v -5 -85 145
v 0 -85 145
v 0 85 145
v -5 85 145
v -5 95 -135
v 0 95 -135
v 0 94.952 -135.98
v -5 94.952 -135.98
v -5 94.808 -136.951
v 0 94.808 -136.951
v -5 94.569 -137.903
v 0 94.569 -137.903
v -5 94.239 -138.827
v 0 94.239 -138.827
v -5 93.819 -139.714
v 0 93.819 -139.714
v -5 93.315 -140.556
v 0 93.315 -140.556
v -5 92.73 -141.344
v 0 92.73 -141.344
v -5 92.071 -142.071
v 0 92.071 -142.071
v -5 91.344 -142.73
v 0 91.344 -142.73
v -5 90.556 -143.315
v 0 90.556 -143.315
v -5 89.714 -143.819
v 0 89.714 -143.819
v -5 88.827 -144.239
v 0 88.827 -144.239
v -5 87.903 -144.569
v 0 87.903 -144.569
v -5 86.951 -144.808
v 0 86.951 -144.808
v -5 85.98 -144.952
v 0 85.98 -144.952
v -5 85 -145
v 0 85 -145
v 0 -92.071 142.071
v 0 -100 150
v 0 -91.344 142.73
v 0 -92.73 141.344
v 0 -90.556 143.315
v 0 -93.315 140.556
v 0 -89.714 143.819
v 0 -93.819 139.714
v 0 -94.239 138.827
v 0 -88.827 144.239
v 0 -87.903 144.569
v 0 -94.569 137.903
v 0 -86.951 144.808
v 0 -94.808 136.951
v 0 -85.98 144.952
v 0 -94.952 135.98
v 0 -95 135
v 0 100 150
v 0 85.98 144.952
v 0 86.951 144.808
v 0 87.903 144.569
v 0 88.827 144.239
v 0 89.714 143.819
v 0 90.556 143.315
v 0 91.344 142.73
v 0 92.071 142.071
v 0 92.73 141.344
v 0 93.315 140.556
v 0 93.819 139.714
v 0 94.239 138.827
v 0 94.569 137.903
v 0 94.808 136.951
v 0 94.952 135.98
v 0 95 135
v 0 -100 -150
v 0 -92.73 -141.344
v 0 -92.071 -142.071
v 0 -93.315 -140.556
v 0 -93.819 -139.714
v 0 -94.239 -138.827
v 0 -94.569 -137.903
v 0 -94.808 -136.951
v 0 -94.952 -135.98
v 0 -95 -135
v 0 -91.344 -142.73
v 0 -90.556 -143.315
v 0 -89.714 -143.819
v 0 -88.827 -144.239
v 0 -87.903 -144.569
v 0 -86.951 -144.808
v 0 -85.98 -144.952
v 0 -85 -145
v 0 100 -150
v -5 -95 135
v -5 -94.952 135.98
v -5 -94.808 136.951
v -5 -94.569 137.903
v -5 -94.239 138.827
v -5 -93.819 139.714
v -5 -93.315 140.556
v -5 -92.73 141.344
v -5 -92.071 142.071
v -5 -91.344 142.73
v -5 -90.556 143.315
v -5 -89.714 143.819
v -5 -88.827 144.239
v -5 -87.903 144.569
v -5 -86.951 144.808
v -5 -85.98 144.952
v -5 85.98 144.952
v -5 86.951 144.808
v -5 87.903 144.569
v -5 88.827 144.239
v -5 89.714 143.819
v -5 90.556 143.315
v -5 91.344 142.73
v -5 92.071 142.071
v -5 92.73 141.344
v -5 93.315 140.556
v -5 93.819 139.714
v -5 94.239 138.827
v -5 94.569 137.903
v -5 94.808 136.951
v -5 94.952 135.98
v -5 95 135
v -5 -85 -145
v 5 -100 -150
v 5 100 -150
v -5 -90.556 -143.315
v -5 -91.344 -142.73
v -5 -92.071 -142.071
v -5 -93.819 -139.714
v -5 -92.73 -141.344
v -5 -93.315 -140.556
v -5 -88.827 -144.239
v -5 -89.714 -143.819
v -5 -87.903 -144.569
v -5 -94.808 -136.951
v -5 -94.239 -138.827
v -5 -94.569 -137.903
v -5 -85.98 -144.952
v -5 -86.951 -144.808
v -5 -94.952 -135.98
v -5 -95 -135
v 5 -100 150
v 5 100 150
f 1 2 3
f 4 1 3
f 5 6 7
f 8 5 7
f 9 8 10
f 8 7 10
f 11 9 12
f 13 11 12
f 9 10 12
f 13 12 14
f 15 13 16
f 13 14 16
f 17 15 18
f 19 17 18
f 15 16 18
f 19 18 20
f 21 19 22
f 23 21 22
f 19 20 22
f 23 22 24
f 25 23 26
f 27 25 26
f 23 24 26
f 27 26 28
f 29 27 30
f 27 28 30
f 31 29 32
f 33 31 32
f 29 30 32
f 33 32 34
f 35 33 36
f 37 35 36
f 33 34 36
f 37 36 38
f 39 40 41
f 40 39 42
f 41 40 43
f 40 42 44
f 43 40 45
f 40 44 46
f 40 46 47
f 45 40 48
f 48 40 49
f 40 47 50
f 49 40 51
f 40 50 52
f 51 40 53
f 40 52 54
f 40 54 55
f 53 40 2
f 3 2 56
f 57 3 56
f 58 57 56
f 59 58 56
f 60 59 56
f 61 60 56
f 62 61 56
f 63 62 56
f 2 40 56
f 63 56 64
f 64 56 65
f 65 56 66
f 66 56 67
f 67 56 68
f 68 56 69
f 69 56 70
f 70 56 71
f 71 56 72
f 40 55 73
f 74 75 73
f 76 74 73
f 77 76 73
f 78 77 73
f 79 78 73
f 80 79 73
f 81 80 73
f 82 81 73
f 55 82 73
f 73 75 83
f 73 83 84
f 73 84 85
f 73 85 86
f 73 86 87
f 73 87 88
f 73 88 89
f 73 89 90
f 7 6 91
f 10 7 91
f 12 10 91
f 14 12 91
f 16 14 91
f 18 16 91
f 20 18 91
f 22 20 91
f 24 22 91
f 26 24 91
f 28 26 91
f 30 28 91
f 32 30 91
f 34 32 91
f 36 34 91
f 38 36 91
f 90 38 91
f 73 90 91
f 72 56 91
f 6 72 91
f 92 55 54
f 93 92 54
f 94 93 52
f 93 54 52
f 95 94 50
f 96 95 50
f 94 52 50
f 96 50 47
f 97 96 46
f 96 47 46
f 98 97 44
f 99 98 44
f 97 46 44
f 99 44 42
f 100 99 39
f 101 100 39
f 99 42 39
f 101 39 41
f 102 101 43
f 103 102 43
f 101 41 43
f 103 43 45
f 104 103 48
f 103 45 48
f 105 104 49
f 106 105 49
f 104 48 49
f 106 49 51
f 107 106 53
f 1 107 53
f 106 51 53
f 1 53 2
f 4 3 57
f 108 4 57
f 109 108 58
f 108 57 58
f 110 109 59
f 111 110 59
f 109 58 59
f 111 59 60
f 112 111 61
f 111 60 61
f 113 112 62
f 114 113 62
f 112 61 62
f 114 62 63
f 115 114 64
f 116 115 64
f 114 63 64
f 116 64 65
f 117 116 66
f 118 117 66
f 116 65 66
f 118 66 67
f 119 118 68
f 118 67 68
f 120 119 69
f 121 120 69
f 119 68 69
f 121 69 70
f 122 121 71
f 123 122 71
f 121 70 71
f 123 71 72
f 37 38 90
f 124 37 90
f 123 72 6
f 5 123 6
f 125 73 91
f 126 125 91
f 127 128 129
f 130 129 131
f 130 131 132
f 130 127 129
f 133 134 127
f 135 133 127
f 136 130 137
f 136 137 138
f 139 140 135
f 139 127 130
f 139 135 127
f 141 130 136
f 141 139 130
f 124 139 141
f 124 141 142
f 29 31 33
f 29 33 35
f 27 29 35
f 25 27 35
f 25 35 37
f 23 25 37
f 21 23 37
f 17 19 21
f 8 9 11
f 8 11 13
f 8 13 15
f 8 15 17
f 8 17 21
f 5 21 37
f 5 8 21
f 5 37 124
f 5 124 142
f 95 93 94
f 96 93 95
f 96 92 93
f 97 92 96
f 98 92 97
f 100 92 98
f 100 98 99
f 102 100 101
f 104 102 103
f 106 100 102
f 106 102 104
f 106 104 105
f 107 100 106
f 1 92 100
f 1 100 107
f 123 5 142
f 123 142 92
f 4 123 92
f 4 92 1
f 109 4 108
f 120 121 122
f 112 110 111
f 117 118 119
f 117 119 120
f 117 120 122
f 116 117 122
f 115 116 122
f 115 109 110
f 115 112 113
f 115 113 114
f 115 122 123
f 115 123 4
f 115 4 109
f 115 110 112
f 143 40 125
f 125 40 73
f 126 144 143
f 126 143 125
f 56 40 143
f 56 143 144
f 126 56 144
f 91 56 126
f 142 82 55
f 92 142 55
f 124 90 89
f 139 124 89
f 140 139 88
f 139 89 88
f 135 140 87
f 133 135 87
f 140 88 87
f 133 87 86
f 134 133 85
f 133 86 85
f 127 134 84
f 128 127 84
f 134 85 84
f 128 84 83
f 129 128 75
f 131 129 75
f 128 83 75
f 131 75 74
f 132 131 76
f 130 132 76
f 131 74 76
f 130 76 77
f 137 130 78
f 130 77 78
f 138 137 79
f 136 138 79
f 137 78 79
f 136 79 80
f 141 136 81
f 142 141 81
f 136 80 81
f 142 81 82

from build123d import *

# Parameters (mm, degrees)
SKETCH1_W           = 300
SKETCH1_H           = 200
BOSS_EXTRUDE1_DEPTH = 5
BOSS_EXTRUDE2_DEPTH = 5


with BuildPart() as part:
    # Sketch1 → Boss-Extrude1 (new body)
    with BuildSketch(Plane(origin=(0, 0, 0), x_dir=(0, 0, -1), z_dir=(1, 0, 0))):
        Rectangle(SKETCH1_W, SKETCH1_H)
    extrude(amount=BOSS_EXTRUDE1_DEPTH)

    # Sketch2 → Boss-Extrude2 (add)
    with BuildSketch(Plane.ZY):
        with BuildLine():
            Line((145, -85), (145, 85))
            ThreePointArc((145, 85), (142.071067812, 92.071067812), (135, 95))
            Line((135, 95), (-135, 95))
            ThreePointArc((-135, 95), (-142.071067812, 92.071067812), (-145, 85))
            Line((-145, 85), (-145, -85))
            ThreePointArc((-145, -85), (-142.071067812, -92.071067812), (-135, -95))
            Line((-135, -95), (135, -95))
            ThreePointArc((135, -95), (142.071067812, -92.071067812), (145, -85))
        make_face()
    extrude(amount=BOSS_EXTRUDE2_DEPTH)


solid = part.part
